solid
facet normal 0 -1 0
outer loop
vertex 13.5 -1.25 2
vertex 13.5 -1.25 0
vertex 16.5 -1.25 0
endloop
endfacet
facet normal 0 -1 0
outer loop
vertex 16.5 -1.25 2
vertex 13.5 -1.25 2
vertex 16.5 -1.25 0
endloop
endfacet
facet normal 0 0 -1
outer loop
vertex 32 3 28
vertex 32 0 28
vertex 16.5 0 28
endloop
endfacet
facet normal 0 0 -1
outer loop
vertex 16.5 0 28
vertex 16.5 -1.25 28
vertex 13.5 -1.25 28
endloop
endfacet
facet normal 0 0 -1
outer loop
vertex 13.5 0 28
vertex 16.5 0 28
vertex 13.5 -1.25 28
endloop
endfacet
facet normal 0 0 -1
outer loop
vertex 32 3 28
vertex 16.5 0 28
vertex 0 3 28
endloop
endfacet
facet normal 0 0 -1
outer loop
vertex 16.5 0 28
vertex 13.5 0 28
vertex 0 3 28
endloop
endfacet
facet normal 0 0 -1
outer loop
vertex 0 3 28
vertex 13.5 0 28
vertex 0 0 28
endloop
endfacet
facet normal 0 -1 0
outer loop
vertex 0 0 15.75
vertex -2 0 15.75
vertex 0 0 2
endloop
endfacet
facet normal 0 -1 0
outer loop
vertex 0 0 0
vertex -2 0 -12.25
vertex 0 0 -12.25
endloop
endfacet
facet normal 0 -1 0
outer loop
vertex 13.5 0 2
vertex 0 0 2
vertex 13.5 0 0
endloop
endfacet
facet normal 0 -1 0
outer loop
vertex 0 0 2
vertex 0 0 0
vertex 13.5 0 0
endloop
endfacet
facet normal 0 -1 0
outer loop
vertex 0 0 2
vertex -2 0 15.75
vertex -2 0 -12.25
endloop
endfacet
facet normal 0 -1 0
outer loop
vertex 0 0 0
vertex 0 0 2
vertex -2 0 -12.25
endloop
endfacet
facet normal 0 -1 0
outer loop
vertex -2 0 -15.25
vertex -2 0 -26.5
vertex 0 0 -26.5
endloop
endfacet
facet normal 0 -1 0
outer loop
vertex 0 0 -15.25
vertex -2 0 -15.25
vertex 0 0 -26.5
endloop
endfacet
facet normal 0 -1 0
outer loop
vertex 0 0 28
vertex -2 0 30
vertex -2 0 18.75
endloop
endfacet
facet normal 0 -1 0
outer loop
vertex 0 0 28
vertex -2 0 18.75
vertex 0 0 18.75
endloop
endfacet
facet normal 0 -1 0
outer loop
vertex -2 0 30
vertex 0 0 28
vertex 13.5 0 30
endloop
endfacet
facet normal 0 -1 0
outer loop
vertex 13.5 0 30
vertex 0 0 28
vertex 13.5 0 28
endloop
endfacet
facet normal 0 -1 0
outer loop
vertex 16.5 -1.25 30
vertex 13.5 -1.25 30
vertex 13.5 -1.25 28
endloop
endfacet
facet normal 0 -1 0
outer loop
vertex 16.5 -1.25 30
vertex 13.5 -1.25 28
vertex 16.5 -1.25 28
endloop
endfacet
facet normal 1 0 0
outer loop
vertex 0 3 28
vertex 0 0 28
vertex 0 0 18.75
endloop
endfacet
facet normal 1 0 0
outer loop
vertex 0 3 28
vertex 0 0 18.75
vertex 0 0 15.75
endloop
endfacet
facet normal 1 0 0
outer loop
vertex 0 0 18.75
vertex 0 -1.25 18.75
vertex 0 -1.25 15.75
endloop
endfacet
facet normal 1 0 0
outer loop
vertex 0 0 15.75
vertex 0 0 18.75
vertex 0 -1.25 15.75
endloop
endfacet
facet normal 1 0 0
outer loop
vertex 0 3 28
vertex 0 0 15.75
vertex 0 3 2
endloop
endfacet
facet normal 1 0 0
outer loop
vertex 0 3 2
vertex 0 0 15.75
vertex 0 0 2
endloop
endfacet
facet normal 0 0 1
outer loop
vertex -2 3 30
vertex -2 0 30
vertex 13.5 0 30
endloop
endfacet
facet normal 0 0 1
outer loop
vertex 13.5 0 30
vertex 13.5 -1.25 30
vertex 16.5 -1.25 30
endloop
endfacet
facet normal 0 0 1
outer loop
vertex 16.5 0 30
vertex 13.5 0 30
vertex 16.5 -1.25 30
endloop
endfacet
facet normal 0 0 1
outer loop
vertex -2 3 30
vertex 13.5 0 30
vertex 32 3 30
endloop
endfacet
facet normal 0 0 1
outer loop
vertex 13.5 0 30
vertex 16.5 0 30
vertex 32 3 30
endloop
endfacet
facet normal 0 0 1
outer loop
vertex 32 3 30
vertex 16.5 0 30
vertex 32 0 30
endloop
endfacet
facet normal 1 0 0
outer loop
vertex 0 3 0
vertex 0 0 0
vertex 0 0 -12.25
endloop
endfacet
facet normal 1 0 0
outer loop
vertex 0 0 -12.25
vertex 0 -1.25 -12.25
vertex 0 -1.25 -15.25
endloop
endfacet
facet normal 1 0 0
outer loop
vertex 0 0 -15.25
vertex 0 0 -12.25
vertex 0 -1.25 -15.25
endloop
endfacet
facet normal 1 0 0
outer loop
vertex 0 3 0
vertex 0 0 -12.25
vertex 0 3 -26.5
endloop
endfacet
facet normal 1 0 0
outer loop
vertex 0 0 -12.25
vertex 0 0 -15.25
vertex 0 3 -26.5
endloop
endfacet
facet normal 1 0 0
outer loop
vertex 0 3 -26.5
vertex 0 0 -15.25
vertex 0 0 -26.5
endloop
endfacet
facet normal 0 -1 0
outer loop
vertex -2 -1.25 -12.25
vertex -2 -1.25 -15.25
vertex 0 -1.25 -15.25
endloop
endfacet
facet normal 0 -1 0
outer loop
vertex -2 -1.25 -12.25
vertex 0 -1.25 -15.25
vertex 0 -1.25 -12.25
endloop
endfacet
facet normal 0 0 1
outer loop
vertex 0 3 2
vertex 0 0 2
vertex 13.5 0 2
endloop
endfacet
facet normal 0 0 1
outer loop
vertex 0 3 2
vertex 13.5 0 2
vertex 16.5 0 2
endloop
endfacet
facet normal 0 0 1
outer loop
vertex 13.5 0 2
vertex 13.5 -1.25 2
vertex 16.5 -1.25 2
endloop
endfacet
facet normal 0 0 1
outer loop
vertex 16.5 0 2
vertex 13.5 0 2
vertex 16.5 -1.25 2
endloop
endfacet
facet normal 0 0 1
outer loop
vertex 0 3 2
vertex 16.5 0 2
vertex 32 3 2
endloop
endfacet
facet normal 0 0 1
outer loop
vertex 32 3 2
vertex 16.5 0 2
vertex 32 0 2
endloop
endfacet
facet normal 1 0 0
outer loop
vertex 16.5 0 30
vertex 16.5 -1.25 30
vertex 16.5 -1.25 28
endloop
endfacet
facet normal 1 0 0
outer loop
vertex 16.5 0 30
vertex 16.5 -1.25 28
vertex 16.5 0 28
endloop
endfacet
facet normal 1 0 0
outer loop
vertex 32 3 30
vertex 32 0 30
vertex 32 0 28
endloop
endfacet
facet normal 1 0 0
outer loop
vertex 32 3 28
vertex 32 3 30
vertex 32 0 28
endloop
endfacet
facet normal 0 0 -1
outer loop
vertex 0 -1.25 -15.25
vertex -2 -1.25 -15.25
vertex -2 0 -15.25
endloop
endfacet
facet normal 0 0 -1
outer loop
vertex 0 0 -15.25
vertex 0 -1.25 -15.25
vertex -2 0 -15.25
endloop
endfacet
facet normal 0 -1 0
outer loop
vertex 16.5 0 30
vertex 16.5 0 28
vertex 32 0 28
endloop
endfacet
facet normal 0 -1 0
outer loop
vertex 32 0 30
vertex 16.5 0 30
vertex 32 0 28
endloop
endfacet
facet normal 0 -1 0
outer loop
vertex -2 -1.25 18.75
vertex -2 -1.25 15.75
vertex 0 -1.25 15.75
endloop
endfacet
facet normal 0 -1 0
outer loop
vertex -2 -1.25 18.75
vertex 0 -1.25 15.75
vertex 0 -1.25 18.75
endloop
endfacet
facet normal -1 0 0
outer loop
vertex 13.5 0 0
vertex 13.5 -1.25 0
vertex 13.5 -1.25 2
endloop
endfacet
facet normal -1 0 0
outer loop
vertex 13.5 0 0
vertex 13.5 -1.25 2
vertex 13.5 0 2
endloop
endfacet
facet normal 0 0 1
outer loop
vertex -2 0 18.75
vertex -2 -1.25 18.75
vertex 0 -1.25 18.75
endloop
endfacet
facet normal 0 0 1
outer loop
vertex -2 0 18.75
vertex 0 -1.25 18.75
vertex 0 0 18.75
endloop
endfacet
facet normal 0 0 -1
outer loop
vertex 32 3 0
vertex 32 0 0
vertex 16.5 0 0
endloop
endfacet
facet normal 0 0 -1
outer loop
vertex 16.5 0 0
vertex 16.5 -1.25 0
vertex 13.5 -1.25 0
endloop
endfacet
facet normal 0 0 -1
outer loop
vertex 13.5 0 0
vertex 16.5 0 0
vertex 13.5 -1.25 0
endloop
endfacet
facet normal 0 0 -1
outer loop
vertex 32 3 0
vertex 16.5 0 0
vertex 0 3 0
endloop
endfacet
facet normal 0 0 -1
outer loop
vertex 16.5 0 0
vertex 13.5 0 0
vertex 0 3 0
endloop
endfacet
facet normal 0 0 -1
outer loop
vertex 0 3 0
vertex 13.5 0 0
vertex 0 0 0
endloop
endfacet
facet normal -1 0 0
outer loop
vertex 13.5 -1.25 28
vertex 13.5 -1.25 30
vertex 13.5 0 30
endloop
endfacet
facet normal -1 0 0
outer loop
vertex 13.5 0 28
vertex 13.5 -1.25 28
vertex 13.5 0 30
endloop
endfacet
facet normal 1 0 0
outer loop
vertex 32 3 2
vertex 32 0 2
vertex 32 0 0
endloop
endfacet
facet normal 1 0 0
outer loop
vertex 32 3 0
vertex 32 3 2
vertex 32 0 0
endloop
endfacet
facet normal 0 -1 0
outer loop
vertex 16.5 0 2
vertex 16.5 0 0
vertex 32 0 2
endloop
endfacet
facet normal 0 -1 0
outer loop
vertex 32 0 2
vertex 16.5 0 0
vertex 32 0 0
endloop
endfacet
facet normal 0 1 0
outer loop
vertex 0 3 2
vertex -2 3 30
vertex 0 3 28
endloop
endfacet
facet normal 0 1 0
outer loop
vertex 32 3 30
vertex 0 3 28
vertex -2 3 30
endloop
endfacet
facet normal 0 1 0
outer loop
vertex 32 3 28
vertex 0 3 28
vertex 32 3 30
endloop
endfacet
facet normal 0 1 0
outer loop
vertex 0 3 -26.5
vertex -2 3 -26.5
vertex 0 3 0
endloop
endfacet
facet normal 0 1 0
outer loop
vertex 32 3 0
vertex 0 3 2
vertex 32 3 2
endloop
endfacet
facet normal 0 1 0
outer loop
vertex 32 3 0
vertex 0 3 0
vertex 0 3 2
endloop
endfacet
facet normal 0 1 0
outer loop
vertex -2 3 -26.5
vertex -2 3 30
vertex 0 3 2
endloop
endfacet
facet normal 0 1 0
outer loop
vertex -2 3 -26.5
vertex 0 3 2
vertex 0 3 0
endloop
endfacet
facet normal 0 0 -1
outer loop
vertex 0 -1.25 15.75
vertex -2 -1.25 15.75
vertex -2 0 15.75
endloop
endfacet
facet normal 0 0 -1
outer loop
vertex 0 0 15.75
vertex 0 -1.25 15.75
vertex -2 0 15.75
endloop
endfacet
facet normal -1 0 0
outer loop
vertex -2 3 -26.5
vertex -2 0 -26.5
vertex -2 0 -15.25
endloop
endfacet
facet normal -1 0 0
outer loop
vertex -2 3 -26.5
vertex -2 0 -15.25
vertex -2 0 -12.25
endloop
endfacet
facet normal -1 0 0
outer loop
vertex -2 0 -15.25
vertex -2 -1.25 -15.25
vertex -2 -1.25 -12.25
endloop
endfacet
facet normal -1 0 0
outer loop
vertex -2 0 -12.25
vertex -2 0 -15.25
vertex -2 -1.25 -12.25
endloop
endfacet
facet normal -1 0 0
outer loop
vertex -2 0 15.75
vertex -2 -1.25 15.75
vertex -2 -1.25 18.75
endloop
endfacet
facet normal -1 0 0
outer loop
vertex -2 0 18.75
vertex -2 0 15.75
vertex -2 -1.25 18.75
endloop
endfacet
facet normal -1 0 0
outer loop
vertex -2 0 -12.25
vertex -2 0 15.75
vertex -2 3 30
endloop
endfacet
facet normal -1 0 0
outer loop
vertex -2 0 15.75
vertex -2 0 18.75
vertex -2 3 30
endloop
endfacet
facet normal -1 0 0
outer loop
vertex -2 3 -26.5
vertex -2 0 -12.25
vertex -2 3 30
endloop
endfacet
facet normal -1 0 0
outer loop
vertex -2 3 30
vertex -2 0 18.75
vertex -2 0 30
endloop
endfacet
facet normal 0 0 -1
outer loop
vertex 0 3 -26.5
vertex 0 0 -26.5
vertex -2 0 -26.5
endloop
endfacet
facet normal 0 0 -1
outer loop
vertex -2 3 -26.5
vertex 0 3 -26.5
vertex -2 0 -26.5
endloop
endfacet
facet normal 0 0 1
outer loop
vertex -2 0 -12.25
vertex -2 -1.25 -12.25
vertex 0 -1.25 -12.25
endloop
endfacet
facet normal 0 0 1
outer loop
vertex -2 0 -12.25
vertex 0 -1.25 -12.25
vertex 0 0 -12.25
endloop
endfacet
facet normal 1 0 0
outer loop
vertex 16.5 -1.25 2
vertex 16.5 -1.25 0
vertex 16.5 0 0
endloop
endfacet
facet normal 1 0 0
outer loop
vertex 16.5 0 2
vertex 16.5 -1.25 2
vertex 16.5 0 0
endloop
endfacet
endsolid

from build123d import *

# Parameters (mm, degrees)
RESSALTO_EXTRUS_O1_DEPTH = 3
ESBO_O3_W                = 3
ESBO_O3_H                = 1.25
RESSALTO_EXTRUS_O2_DEPTH = 2
ESBO_O4_W                = 3
ESBO_O4_H                = 1.25
RESSALTO_EXTRUS_O3_DEPTH = 2


with BuildPart() as part:
    # Esboço1 → Ressalto-extrusão1 (new body)
    with BuildSketch(Plane(origin=(0, 0, 0), x_dir=(1, 0, 0), z_dir=(0, 1, 0))):
        Polygon((0, -28), (0, -2), (32, -2), (32, 0), (0, 0), (0, 26.5), (-2, 26.5), (-2, -30), (32, -30), (32, -28), align=None)
    extrude(amount=RESSALTO_EXTRUS_O1_DEPTH)

    # Esboço3 → Ressalto-extrusão2 (add)
    with BuildSketch(Plane.ZY.offset(2)):
        with Locations((-13.75, -0.625)):
            Rectangle(ESBO_O3_W, ESBO_O3_H)
        with Locations((17.25, -0.625)):
            Rectangle(ESBO_O3_W, ESBO_O3_H)
    extrude(amount=-RESSALTO_EXTRUS_O2_DEPTH)

    # Esboço4 → Ressalto-extrusão3 (add)
    with BuildSketch(Plane.XY.offset(30)):
        with Locations((15, -0.625)):
            Rectangle(ESBO_O4_W, ESBO_O4_H)
    ressalto_extrus_o3 = extrude(amount=-RESSALTO_EXTRUS_O3_DEPTH)

    # Espelhar1: Ressalto-extrusão3 across plane
    add(ressalto_extrus_o3.mirror(Plane.XY.offset(15)))


solid = part.part
